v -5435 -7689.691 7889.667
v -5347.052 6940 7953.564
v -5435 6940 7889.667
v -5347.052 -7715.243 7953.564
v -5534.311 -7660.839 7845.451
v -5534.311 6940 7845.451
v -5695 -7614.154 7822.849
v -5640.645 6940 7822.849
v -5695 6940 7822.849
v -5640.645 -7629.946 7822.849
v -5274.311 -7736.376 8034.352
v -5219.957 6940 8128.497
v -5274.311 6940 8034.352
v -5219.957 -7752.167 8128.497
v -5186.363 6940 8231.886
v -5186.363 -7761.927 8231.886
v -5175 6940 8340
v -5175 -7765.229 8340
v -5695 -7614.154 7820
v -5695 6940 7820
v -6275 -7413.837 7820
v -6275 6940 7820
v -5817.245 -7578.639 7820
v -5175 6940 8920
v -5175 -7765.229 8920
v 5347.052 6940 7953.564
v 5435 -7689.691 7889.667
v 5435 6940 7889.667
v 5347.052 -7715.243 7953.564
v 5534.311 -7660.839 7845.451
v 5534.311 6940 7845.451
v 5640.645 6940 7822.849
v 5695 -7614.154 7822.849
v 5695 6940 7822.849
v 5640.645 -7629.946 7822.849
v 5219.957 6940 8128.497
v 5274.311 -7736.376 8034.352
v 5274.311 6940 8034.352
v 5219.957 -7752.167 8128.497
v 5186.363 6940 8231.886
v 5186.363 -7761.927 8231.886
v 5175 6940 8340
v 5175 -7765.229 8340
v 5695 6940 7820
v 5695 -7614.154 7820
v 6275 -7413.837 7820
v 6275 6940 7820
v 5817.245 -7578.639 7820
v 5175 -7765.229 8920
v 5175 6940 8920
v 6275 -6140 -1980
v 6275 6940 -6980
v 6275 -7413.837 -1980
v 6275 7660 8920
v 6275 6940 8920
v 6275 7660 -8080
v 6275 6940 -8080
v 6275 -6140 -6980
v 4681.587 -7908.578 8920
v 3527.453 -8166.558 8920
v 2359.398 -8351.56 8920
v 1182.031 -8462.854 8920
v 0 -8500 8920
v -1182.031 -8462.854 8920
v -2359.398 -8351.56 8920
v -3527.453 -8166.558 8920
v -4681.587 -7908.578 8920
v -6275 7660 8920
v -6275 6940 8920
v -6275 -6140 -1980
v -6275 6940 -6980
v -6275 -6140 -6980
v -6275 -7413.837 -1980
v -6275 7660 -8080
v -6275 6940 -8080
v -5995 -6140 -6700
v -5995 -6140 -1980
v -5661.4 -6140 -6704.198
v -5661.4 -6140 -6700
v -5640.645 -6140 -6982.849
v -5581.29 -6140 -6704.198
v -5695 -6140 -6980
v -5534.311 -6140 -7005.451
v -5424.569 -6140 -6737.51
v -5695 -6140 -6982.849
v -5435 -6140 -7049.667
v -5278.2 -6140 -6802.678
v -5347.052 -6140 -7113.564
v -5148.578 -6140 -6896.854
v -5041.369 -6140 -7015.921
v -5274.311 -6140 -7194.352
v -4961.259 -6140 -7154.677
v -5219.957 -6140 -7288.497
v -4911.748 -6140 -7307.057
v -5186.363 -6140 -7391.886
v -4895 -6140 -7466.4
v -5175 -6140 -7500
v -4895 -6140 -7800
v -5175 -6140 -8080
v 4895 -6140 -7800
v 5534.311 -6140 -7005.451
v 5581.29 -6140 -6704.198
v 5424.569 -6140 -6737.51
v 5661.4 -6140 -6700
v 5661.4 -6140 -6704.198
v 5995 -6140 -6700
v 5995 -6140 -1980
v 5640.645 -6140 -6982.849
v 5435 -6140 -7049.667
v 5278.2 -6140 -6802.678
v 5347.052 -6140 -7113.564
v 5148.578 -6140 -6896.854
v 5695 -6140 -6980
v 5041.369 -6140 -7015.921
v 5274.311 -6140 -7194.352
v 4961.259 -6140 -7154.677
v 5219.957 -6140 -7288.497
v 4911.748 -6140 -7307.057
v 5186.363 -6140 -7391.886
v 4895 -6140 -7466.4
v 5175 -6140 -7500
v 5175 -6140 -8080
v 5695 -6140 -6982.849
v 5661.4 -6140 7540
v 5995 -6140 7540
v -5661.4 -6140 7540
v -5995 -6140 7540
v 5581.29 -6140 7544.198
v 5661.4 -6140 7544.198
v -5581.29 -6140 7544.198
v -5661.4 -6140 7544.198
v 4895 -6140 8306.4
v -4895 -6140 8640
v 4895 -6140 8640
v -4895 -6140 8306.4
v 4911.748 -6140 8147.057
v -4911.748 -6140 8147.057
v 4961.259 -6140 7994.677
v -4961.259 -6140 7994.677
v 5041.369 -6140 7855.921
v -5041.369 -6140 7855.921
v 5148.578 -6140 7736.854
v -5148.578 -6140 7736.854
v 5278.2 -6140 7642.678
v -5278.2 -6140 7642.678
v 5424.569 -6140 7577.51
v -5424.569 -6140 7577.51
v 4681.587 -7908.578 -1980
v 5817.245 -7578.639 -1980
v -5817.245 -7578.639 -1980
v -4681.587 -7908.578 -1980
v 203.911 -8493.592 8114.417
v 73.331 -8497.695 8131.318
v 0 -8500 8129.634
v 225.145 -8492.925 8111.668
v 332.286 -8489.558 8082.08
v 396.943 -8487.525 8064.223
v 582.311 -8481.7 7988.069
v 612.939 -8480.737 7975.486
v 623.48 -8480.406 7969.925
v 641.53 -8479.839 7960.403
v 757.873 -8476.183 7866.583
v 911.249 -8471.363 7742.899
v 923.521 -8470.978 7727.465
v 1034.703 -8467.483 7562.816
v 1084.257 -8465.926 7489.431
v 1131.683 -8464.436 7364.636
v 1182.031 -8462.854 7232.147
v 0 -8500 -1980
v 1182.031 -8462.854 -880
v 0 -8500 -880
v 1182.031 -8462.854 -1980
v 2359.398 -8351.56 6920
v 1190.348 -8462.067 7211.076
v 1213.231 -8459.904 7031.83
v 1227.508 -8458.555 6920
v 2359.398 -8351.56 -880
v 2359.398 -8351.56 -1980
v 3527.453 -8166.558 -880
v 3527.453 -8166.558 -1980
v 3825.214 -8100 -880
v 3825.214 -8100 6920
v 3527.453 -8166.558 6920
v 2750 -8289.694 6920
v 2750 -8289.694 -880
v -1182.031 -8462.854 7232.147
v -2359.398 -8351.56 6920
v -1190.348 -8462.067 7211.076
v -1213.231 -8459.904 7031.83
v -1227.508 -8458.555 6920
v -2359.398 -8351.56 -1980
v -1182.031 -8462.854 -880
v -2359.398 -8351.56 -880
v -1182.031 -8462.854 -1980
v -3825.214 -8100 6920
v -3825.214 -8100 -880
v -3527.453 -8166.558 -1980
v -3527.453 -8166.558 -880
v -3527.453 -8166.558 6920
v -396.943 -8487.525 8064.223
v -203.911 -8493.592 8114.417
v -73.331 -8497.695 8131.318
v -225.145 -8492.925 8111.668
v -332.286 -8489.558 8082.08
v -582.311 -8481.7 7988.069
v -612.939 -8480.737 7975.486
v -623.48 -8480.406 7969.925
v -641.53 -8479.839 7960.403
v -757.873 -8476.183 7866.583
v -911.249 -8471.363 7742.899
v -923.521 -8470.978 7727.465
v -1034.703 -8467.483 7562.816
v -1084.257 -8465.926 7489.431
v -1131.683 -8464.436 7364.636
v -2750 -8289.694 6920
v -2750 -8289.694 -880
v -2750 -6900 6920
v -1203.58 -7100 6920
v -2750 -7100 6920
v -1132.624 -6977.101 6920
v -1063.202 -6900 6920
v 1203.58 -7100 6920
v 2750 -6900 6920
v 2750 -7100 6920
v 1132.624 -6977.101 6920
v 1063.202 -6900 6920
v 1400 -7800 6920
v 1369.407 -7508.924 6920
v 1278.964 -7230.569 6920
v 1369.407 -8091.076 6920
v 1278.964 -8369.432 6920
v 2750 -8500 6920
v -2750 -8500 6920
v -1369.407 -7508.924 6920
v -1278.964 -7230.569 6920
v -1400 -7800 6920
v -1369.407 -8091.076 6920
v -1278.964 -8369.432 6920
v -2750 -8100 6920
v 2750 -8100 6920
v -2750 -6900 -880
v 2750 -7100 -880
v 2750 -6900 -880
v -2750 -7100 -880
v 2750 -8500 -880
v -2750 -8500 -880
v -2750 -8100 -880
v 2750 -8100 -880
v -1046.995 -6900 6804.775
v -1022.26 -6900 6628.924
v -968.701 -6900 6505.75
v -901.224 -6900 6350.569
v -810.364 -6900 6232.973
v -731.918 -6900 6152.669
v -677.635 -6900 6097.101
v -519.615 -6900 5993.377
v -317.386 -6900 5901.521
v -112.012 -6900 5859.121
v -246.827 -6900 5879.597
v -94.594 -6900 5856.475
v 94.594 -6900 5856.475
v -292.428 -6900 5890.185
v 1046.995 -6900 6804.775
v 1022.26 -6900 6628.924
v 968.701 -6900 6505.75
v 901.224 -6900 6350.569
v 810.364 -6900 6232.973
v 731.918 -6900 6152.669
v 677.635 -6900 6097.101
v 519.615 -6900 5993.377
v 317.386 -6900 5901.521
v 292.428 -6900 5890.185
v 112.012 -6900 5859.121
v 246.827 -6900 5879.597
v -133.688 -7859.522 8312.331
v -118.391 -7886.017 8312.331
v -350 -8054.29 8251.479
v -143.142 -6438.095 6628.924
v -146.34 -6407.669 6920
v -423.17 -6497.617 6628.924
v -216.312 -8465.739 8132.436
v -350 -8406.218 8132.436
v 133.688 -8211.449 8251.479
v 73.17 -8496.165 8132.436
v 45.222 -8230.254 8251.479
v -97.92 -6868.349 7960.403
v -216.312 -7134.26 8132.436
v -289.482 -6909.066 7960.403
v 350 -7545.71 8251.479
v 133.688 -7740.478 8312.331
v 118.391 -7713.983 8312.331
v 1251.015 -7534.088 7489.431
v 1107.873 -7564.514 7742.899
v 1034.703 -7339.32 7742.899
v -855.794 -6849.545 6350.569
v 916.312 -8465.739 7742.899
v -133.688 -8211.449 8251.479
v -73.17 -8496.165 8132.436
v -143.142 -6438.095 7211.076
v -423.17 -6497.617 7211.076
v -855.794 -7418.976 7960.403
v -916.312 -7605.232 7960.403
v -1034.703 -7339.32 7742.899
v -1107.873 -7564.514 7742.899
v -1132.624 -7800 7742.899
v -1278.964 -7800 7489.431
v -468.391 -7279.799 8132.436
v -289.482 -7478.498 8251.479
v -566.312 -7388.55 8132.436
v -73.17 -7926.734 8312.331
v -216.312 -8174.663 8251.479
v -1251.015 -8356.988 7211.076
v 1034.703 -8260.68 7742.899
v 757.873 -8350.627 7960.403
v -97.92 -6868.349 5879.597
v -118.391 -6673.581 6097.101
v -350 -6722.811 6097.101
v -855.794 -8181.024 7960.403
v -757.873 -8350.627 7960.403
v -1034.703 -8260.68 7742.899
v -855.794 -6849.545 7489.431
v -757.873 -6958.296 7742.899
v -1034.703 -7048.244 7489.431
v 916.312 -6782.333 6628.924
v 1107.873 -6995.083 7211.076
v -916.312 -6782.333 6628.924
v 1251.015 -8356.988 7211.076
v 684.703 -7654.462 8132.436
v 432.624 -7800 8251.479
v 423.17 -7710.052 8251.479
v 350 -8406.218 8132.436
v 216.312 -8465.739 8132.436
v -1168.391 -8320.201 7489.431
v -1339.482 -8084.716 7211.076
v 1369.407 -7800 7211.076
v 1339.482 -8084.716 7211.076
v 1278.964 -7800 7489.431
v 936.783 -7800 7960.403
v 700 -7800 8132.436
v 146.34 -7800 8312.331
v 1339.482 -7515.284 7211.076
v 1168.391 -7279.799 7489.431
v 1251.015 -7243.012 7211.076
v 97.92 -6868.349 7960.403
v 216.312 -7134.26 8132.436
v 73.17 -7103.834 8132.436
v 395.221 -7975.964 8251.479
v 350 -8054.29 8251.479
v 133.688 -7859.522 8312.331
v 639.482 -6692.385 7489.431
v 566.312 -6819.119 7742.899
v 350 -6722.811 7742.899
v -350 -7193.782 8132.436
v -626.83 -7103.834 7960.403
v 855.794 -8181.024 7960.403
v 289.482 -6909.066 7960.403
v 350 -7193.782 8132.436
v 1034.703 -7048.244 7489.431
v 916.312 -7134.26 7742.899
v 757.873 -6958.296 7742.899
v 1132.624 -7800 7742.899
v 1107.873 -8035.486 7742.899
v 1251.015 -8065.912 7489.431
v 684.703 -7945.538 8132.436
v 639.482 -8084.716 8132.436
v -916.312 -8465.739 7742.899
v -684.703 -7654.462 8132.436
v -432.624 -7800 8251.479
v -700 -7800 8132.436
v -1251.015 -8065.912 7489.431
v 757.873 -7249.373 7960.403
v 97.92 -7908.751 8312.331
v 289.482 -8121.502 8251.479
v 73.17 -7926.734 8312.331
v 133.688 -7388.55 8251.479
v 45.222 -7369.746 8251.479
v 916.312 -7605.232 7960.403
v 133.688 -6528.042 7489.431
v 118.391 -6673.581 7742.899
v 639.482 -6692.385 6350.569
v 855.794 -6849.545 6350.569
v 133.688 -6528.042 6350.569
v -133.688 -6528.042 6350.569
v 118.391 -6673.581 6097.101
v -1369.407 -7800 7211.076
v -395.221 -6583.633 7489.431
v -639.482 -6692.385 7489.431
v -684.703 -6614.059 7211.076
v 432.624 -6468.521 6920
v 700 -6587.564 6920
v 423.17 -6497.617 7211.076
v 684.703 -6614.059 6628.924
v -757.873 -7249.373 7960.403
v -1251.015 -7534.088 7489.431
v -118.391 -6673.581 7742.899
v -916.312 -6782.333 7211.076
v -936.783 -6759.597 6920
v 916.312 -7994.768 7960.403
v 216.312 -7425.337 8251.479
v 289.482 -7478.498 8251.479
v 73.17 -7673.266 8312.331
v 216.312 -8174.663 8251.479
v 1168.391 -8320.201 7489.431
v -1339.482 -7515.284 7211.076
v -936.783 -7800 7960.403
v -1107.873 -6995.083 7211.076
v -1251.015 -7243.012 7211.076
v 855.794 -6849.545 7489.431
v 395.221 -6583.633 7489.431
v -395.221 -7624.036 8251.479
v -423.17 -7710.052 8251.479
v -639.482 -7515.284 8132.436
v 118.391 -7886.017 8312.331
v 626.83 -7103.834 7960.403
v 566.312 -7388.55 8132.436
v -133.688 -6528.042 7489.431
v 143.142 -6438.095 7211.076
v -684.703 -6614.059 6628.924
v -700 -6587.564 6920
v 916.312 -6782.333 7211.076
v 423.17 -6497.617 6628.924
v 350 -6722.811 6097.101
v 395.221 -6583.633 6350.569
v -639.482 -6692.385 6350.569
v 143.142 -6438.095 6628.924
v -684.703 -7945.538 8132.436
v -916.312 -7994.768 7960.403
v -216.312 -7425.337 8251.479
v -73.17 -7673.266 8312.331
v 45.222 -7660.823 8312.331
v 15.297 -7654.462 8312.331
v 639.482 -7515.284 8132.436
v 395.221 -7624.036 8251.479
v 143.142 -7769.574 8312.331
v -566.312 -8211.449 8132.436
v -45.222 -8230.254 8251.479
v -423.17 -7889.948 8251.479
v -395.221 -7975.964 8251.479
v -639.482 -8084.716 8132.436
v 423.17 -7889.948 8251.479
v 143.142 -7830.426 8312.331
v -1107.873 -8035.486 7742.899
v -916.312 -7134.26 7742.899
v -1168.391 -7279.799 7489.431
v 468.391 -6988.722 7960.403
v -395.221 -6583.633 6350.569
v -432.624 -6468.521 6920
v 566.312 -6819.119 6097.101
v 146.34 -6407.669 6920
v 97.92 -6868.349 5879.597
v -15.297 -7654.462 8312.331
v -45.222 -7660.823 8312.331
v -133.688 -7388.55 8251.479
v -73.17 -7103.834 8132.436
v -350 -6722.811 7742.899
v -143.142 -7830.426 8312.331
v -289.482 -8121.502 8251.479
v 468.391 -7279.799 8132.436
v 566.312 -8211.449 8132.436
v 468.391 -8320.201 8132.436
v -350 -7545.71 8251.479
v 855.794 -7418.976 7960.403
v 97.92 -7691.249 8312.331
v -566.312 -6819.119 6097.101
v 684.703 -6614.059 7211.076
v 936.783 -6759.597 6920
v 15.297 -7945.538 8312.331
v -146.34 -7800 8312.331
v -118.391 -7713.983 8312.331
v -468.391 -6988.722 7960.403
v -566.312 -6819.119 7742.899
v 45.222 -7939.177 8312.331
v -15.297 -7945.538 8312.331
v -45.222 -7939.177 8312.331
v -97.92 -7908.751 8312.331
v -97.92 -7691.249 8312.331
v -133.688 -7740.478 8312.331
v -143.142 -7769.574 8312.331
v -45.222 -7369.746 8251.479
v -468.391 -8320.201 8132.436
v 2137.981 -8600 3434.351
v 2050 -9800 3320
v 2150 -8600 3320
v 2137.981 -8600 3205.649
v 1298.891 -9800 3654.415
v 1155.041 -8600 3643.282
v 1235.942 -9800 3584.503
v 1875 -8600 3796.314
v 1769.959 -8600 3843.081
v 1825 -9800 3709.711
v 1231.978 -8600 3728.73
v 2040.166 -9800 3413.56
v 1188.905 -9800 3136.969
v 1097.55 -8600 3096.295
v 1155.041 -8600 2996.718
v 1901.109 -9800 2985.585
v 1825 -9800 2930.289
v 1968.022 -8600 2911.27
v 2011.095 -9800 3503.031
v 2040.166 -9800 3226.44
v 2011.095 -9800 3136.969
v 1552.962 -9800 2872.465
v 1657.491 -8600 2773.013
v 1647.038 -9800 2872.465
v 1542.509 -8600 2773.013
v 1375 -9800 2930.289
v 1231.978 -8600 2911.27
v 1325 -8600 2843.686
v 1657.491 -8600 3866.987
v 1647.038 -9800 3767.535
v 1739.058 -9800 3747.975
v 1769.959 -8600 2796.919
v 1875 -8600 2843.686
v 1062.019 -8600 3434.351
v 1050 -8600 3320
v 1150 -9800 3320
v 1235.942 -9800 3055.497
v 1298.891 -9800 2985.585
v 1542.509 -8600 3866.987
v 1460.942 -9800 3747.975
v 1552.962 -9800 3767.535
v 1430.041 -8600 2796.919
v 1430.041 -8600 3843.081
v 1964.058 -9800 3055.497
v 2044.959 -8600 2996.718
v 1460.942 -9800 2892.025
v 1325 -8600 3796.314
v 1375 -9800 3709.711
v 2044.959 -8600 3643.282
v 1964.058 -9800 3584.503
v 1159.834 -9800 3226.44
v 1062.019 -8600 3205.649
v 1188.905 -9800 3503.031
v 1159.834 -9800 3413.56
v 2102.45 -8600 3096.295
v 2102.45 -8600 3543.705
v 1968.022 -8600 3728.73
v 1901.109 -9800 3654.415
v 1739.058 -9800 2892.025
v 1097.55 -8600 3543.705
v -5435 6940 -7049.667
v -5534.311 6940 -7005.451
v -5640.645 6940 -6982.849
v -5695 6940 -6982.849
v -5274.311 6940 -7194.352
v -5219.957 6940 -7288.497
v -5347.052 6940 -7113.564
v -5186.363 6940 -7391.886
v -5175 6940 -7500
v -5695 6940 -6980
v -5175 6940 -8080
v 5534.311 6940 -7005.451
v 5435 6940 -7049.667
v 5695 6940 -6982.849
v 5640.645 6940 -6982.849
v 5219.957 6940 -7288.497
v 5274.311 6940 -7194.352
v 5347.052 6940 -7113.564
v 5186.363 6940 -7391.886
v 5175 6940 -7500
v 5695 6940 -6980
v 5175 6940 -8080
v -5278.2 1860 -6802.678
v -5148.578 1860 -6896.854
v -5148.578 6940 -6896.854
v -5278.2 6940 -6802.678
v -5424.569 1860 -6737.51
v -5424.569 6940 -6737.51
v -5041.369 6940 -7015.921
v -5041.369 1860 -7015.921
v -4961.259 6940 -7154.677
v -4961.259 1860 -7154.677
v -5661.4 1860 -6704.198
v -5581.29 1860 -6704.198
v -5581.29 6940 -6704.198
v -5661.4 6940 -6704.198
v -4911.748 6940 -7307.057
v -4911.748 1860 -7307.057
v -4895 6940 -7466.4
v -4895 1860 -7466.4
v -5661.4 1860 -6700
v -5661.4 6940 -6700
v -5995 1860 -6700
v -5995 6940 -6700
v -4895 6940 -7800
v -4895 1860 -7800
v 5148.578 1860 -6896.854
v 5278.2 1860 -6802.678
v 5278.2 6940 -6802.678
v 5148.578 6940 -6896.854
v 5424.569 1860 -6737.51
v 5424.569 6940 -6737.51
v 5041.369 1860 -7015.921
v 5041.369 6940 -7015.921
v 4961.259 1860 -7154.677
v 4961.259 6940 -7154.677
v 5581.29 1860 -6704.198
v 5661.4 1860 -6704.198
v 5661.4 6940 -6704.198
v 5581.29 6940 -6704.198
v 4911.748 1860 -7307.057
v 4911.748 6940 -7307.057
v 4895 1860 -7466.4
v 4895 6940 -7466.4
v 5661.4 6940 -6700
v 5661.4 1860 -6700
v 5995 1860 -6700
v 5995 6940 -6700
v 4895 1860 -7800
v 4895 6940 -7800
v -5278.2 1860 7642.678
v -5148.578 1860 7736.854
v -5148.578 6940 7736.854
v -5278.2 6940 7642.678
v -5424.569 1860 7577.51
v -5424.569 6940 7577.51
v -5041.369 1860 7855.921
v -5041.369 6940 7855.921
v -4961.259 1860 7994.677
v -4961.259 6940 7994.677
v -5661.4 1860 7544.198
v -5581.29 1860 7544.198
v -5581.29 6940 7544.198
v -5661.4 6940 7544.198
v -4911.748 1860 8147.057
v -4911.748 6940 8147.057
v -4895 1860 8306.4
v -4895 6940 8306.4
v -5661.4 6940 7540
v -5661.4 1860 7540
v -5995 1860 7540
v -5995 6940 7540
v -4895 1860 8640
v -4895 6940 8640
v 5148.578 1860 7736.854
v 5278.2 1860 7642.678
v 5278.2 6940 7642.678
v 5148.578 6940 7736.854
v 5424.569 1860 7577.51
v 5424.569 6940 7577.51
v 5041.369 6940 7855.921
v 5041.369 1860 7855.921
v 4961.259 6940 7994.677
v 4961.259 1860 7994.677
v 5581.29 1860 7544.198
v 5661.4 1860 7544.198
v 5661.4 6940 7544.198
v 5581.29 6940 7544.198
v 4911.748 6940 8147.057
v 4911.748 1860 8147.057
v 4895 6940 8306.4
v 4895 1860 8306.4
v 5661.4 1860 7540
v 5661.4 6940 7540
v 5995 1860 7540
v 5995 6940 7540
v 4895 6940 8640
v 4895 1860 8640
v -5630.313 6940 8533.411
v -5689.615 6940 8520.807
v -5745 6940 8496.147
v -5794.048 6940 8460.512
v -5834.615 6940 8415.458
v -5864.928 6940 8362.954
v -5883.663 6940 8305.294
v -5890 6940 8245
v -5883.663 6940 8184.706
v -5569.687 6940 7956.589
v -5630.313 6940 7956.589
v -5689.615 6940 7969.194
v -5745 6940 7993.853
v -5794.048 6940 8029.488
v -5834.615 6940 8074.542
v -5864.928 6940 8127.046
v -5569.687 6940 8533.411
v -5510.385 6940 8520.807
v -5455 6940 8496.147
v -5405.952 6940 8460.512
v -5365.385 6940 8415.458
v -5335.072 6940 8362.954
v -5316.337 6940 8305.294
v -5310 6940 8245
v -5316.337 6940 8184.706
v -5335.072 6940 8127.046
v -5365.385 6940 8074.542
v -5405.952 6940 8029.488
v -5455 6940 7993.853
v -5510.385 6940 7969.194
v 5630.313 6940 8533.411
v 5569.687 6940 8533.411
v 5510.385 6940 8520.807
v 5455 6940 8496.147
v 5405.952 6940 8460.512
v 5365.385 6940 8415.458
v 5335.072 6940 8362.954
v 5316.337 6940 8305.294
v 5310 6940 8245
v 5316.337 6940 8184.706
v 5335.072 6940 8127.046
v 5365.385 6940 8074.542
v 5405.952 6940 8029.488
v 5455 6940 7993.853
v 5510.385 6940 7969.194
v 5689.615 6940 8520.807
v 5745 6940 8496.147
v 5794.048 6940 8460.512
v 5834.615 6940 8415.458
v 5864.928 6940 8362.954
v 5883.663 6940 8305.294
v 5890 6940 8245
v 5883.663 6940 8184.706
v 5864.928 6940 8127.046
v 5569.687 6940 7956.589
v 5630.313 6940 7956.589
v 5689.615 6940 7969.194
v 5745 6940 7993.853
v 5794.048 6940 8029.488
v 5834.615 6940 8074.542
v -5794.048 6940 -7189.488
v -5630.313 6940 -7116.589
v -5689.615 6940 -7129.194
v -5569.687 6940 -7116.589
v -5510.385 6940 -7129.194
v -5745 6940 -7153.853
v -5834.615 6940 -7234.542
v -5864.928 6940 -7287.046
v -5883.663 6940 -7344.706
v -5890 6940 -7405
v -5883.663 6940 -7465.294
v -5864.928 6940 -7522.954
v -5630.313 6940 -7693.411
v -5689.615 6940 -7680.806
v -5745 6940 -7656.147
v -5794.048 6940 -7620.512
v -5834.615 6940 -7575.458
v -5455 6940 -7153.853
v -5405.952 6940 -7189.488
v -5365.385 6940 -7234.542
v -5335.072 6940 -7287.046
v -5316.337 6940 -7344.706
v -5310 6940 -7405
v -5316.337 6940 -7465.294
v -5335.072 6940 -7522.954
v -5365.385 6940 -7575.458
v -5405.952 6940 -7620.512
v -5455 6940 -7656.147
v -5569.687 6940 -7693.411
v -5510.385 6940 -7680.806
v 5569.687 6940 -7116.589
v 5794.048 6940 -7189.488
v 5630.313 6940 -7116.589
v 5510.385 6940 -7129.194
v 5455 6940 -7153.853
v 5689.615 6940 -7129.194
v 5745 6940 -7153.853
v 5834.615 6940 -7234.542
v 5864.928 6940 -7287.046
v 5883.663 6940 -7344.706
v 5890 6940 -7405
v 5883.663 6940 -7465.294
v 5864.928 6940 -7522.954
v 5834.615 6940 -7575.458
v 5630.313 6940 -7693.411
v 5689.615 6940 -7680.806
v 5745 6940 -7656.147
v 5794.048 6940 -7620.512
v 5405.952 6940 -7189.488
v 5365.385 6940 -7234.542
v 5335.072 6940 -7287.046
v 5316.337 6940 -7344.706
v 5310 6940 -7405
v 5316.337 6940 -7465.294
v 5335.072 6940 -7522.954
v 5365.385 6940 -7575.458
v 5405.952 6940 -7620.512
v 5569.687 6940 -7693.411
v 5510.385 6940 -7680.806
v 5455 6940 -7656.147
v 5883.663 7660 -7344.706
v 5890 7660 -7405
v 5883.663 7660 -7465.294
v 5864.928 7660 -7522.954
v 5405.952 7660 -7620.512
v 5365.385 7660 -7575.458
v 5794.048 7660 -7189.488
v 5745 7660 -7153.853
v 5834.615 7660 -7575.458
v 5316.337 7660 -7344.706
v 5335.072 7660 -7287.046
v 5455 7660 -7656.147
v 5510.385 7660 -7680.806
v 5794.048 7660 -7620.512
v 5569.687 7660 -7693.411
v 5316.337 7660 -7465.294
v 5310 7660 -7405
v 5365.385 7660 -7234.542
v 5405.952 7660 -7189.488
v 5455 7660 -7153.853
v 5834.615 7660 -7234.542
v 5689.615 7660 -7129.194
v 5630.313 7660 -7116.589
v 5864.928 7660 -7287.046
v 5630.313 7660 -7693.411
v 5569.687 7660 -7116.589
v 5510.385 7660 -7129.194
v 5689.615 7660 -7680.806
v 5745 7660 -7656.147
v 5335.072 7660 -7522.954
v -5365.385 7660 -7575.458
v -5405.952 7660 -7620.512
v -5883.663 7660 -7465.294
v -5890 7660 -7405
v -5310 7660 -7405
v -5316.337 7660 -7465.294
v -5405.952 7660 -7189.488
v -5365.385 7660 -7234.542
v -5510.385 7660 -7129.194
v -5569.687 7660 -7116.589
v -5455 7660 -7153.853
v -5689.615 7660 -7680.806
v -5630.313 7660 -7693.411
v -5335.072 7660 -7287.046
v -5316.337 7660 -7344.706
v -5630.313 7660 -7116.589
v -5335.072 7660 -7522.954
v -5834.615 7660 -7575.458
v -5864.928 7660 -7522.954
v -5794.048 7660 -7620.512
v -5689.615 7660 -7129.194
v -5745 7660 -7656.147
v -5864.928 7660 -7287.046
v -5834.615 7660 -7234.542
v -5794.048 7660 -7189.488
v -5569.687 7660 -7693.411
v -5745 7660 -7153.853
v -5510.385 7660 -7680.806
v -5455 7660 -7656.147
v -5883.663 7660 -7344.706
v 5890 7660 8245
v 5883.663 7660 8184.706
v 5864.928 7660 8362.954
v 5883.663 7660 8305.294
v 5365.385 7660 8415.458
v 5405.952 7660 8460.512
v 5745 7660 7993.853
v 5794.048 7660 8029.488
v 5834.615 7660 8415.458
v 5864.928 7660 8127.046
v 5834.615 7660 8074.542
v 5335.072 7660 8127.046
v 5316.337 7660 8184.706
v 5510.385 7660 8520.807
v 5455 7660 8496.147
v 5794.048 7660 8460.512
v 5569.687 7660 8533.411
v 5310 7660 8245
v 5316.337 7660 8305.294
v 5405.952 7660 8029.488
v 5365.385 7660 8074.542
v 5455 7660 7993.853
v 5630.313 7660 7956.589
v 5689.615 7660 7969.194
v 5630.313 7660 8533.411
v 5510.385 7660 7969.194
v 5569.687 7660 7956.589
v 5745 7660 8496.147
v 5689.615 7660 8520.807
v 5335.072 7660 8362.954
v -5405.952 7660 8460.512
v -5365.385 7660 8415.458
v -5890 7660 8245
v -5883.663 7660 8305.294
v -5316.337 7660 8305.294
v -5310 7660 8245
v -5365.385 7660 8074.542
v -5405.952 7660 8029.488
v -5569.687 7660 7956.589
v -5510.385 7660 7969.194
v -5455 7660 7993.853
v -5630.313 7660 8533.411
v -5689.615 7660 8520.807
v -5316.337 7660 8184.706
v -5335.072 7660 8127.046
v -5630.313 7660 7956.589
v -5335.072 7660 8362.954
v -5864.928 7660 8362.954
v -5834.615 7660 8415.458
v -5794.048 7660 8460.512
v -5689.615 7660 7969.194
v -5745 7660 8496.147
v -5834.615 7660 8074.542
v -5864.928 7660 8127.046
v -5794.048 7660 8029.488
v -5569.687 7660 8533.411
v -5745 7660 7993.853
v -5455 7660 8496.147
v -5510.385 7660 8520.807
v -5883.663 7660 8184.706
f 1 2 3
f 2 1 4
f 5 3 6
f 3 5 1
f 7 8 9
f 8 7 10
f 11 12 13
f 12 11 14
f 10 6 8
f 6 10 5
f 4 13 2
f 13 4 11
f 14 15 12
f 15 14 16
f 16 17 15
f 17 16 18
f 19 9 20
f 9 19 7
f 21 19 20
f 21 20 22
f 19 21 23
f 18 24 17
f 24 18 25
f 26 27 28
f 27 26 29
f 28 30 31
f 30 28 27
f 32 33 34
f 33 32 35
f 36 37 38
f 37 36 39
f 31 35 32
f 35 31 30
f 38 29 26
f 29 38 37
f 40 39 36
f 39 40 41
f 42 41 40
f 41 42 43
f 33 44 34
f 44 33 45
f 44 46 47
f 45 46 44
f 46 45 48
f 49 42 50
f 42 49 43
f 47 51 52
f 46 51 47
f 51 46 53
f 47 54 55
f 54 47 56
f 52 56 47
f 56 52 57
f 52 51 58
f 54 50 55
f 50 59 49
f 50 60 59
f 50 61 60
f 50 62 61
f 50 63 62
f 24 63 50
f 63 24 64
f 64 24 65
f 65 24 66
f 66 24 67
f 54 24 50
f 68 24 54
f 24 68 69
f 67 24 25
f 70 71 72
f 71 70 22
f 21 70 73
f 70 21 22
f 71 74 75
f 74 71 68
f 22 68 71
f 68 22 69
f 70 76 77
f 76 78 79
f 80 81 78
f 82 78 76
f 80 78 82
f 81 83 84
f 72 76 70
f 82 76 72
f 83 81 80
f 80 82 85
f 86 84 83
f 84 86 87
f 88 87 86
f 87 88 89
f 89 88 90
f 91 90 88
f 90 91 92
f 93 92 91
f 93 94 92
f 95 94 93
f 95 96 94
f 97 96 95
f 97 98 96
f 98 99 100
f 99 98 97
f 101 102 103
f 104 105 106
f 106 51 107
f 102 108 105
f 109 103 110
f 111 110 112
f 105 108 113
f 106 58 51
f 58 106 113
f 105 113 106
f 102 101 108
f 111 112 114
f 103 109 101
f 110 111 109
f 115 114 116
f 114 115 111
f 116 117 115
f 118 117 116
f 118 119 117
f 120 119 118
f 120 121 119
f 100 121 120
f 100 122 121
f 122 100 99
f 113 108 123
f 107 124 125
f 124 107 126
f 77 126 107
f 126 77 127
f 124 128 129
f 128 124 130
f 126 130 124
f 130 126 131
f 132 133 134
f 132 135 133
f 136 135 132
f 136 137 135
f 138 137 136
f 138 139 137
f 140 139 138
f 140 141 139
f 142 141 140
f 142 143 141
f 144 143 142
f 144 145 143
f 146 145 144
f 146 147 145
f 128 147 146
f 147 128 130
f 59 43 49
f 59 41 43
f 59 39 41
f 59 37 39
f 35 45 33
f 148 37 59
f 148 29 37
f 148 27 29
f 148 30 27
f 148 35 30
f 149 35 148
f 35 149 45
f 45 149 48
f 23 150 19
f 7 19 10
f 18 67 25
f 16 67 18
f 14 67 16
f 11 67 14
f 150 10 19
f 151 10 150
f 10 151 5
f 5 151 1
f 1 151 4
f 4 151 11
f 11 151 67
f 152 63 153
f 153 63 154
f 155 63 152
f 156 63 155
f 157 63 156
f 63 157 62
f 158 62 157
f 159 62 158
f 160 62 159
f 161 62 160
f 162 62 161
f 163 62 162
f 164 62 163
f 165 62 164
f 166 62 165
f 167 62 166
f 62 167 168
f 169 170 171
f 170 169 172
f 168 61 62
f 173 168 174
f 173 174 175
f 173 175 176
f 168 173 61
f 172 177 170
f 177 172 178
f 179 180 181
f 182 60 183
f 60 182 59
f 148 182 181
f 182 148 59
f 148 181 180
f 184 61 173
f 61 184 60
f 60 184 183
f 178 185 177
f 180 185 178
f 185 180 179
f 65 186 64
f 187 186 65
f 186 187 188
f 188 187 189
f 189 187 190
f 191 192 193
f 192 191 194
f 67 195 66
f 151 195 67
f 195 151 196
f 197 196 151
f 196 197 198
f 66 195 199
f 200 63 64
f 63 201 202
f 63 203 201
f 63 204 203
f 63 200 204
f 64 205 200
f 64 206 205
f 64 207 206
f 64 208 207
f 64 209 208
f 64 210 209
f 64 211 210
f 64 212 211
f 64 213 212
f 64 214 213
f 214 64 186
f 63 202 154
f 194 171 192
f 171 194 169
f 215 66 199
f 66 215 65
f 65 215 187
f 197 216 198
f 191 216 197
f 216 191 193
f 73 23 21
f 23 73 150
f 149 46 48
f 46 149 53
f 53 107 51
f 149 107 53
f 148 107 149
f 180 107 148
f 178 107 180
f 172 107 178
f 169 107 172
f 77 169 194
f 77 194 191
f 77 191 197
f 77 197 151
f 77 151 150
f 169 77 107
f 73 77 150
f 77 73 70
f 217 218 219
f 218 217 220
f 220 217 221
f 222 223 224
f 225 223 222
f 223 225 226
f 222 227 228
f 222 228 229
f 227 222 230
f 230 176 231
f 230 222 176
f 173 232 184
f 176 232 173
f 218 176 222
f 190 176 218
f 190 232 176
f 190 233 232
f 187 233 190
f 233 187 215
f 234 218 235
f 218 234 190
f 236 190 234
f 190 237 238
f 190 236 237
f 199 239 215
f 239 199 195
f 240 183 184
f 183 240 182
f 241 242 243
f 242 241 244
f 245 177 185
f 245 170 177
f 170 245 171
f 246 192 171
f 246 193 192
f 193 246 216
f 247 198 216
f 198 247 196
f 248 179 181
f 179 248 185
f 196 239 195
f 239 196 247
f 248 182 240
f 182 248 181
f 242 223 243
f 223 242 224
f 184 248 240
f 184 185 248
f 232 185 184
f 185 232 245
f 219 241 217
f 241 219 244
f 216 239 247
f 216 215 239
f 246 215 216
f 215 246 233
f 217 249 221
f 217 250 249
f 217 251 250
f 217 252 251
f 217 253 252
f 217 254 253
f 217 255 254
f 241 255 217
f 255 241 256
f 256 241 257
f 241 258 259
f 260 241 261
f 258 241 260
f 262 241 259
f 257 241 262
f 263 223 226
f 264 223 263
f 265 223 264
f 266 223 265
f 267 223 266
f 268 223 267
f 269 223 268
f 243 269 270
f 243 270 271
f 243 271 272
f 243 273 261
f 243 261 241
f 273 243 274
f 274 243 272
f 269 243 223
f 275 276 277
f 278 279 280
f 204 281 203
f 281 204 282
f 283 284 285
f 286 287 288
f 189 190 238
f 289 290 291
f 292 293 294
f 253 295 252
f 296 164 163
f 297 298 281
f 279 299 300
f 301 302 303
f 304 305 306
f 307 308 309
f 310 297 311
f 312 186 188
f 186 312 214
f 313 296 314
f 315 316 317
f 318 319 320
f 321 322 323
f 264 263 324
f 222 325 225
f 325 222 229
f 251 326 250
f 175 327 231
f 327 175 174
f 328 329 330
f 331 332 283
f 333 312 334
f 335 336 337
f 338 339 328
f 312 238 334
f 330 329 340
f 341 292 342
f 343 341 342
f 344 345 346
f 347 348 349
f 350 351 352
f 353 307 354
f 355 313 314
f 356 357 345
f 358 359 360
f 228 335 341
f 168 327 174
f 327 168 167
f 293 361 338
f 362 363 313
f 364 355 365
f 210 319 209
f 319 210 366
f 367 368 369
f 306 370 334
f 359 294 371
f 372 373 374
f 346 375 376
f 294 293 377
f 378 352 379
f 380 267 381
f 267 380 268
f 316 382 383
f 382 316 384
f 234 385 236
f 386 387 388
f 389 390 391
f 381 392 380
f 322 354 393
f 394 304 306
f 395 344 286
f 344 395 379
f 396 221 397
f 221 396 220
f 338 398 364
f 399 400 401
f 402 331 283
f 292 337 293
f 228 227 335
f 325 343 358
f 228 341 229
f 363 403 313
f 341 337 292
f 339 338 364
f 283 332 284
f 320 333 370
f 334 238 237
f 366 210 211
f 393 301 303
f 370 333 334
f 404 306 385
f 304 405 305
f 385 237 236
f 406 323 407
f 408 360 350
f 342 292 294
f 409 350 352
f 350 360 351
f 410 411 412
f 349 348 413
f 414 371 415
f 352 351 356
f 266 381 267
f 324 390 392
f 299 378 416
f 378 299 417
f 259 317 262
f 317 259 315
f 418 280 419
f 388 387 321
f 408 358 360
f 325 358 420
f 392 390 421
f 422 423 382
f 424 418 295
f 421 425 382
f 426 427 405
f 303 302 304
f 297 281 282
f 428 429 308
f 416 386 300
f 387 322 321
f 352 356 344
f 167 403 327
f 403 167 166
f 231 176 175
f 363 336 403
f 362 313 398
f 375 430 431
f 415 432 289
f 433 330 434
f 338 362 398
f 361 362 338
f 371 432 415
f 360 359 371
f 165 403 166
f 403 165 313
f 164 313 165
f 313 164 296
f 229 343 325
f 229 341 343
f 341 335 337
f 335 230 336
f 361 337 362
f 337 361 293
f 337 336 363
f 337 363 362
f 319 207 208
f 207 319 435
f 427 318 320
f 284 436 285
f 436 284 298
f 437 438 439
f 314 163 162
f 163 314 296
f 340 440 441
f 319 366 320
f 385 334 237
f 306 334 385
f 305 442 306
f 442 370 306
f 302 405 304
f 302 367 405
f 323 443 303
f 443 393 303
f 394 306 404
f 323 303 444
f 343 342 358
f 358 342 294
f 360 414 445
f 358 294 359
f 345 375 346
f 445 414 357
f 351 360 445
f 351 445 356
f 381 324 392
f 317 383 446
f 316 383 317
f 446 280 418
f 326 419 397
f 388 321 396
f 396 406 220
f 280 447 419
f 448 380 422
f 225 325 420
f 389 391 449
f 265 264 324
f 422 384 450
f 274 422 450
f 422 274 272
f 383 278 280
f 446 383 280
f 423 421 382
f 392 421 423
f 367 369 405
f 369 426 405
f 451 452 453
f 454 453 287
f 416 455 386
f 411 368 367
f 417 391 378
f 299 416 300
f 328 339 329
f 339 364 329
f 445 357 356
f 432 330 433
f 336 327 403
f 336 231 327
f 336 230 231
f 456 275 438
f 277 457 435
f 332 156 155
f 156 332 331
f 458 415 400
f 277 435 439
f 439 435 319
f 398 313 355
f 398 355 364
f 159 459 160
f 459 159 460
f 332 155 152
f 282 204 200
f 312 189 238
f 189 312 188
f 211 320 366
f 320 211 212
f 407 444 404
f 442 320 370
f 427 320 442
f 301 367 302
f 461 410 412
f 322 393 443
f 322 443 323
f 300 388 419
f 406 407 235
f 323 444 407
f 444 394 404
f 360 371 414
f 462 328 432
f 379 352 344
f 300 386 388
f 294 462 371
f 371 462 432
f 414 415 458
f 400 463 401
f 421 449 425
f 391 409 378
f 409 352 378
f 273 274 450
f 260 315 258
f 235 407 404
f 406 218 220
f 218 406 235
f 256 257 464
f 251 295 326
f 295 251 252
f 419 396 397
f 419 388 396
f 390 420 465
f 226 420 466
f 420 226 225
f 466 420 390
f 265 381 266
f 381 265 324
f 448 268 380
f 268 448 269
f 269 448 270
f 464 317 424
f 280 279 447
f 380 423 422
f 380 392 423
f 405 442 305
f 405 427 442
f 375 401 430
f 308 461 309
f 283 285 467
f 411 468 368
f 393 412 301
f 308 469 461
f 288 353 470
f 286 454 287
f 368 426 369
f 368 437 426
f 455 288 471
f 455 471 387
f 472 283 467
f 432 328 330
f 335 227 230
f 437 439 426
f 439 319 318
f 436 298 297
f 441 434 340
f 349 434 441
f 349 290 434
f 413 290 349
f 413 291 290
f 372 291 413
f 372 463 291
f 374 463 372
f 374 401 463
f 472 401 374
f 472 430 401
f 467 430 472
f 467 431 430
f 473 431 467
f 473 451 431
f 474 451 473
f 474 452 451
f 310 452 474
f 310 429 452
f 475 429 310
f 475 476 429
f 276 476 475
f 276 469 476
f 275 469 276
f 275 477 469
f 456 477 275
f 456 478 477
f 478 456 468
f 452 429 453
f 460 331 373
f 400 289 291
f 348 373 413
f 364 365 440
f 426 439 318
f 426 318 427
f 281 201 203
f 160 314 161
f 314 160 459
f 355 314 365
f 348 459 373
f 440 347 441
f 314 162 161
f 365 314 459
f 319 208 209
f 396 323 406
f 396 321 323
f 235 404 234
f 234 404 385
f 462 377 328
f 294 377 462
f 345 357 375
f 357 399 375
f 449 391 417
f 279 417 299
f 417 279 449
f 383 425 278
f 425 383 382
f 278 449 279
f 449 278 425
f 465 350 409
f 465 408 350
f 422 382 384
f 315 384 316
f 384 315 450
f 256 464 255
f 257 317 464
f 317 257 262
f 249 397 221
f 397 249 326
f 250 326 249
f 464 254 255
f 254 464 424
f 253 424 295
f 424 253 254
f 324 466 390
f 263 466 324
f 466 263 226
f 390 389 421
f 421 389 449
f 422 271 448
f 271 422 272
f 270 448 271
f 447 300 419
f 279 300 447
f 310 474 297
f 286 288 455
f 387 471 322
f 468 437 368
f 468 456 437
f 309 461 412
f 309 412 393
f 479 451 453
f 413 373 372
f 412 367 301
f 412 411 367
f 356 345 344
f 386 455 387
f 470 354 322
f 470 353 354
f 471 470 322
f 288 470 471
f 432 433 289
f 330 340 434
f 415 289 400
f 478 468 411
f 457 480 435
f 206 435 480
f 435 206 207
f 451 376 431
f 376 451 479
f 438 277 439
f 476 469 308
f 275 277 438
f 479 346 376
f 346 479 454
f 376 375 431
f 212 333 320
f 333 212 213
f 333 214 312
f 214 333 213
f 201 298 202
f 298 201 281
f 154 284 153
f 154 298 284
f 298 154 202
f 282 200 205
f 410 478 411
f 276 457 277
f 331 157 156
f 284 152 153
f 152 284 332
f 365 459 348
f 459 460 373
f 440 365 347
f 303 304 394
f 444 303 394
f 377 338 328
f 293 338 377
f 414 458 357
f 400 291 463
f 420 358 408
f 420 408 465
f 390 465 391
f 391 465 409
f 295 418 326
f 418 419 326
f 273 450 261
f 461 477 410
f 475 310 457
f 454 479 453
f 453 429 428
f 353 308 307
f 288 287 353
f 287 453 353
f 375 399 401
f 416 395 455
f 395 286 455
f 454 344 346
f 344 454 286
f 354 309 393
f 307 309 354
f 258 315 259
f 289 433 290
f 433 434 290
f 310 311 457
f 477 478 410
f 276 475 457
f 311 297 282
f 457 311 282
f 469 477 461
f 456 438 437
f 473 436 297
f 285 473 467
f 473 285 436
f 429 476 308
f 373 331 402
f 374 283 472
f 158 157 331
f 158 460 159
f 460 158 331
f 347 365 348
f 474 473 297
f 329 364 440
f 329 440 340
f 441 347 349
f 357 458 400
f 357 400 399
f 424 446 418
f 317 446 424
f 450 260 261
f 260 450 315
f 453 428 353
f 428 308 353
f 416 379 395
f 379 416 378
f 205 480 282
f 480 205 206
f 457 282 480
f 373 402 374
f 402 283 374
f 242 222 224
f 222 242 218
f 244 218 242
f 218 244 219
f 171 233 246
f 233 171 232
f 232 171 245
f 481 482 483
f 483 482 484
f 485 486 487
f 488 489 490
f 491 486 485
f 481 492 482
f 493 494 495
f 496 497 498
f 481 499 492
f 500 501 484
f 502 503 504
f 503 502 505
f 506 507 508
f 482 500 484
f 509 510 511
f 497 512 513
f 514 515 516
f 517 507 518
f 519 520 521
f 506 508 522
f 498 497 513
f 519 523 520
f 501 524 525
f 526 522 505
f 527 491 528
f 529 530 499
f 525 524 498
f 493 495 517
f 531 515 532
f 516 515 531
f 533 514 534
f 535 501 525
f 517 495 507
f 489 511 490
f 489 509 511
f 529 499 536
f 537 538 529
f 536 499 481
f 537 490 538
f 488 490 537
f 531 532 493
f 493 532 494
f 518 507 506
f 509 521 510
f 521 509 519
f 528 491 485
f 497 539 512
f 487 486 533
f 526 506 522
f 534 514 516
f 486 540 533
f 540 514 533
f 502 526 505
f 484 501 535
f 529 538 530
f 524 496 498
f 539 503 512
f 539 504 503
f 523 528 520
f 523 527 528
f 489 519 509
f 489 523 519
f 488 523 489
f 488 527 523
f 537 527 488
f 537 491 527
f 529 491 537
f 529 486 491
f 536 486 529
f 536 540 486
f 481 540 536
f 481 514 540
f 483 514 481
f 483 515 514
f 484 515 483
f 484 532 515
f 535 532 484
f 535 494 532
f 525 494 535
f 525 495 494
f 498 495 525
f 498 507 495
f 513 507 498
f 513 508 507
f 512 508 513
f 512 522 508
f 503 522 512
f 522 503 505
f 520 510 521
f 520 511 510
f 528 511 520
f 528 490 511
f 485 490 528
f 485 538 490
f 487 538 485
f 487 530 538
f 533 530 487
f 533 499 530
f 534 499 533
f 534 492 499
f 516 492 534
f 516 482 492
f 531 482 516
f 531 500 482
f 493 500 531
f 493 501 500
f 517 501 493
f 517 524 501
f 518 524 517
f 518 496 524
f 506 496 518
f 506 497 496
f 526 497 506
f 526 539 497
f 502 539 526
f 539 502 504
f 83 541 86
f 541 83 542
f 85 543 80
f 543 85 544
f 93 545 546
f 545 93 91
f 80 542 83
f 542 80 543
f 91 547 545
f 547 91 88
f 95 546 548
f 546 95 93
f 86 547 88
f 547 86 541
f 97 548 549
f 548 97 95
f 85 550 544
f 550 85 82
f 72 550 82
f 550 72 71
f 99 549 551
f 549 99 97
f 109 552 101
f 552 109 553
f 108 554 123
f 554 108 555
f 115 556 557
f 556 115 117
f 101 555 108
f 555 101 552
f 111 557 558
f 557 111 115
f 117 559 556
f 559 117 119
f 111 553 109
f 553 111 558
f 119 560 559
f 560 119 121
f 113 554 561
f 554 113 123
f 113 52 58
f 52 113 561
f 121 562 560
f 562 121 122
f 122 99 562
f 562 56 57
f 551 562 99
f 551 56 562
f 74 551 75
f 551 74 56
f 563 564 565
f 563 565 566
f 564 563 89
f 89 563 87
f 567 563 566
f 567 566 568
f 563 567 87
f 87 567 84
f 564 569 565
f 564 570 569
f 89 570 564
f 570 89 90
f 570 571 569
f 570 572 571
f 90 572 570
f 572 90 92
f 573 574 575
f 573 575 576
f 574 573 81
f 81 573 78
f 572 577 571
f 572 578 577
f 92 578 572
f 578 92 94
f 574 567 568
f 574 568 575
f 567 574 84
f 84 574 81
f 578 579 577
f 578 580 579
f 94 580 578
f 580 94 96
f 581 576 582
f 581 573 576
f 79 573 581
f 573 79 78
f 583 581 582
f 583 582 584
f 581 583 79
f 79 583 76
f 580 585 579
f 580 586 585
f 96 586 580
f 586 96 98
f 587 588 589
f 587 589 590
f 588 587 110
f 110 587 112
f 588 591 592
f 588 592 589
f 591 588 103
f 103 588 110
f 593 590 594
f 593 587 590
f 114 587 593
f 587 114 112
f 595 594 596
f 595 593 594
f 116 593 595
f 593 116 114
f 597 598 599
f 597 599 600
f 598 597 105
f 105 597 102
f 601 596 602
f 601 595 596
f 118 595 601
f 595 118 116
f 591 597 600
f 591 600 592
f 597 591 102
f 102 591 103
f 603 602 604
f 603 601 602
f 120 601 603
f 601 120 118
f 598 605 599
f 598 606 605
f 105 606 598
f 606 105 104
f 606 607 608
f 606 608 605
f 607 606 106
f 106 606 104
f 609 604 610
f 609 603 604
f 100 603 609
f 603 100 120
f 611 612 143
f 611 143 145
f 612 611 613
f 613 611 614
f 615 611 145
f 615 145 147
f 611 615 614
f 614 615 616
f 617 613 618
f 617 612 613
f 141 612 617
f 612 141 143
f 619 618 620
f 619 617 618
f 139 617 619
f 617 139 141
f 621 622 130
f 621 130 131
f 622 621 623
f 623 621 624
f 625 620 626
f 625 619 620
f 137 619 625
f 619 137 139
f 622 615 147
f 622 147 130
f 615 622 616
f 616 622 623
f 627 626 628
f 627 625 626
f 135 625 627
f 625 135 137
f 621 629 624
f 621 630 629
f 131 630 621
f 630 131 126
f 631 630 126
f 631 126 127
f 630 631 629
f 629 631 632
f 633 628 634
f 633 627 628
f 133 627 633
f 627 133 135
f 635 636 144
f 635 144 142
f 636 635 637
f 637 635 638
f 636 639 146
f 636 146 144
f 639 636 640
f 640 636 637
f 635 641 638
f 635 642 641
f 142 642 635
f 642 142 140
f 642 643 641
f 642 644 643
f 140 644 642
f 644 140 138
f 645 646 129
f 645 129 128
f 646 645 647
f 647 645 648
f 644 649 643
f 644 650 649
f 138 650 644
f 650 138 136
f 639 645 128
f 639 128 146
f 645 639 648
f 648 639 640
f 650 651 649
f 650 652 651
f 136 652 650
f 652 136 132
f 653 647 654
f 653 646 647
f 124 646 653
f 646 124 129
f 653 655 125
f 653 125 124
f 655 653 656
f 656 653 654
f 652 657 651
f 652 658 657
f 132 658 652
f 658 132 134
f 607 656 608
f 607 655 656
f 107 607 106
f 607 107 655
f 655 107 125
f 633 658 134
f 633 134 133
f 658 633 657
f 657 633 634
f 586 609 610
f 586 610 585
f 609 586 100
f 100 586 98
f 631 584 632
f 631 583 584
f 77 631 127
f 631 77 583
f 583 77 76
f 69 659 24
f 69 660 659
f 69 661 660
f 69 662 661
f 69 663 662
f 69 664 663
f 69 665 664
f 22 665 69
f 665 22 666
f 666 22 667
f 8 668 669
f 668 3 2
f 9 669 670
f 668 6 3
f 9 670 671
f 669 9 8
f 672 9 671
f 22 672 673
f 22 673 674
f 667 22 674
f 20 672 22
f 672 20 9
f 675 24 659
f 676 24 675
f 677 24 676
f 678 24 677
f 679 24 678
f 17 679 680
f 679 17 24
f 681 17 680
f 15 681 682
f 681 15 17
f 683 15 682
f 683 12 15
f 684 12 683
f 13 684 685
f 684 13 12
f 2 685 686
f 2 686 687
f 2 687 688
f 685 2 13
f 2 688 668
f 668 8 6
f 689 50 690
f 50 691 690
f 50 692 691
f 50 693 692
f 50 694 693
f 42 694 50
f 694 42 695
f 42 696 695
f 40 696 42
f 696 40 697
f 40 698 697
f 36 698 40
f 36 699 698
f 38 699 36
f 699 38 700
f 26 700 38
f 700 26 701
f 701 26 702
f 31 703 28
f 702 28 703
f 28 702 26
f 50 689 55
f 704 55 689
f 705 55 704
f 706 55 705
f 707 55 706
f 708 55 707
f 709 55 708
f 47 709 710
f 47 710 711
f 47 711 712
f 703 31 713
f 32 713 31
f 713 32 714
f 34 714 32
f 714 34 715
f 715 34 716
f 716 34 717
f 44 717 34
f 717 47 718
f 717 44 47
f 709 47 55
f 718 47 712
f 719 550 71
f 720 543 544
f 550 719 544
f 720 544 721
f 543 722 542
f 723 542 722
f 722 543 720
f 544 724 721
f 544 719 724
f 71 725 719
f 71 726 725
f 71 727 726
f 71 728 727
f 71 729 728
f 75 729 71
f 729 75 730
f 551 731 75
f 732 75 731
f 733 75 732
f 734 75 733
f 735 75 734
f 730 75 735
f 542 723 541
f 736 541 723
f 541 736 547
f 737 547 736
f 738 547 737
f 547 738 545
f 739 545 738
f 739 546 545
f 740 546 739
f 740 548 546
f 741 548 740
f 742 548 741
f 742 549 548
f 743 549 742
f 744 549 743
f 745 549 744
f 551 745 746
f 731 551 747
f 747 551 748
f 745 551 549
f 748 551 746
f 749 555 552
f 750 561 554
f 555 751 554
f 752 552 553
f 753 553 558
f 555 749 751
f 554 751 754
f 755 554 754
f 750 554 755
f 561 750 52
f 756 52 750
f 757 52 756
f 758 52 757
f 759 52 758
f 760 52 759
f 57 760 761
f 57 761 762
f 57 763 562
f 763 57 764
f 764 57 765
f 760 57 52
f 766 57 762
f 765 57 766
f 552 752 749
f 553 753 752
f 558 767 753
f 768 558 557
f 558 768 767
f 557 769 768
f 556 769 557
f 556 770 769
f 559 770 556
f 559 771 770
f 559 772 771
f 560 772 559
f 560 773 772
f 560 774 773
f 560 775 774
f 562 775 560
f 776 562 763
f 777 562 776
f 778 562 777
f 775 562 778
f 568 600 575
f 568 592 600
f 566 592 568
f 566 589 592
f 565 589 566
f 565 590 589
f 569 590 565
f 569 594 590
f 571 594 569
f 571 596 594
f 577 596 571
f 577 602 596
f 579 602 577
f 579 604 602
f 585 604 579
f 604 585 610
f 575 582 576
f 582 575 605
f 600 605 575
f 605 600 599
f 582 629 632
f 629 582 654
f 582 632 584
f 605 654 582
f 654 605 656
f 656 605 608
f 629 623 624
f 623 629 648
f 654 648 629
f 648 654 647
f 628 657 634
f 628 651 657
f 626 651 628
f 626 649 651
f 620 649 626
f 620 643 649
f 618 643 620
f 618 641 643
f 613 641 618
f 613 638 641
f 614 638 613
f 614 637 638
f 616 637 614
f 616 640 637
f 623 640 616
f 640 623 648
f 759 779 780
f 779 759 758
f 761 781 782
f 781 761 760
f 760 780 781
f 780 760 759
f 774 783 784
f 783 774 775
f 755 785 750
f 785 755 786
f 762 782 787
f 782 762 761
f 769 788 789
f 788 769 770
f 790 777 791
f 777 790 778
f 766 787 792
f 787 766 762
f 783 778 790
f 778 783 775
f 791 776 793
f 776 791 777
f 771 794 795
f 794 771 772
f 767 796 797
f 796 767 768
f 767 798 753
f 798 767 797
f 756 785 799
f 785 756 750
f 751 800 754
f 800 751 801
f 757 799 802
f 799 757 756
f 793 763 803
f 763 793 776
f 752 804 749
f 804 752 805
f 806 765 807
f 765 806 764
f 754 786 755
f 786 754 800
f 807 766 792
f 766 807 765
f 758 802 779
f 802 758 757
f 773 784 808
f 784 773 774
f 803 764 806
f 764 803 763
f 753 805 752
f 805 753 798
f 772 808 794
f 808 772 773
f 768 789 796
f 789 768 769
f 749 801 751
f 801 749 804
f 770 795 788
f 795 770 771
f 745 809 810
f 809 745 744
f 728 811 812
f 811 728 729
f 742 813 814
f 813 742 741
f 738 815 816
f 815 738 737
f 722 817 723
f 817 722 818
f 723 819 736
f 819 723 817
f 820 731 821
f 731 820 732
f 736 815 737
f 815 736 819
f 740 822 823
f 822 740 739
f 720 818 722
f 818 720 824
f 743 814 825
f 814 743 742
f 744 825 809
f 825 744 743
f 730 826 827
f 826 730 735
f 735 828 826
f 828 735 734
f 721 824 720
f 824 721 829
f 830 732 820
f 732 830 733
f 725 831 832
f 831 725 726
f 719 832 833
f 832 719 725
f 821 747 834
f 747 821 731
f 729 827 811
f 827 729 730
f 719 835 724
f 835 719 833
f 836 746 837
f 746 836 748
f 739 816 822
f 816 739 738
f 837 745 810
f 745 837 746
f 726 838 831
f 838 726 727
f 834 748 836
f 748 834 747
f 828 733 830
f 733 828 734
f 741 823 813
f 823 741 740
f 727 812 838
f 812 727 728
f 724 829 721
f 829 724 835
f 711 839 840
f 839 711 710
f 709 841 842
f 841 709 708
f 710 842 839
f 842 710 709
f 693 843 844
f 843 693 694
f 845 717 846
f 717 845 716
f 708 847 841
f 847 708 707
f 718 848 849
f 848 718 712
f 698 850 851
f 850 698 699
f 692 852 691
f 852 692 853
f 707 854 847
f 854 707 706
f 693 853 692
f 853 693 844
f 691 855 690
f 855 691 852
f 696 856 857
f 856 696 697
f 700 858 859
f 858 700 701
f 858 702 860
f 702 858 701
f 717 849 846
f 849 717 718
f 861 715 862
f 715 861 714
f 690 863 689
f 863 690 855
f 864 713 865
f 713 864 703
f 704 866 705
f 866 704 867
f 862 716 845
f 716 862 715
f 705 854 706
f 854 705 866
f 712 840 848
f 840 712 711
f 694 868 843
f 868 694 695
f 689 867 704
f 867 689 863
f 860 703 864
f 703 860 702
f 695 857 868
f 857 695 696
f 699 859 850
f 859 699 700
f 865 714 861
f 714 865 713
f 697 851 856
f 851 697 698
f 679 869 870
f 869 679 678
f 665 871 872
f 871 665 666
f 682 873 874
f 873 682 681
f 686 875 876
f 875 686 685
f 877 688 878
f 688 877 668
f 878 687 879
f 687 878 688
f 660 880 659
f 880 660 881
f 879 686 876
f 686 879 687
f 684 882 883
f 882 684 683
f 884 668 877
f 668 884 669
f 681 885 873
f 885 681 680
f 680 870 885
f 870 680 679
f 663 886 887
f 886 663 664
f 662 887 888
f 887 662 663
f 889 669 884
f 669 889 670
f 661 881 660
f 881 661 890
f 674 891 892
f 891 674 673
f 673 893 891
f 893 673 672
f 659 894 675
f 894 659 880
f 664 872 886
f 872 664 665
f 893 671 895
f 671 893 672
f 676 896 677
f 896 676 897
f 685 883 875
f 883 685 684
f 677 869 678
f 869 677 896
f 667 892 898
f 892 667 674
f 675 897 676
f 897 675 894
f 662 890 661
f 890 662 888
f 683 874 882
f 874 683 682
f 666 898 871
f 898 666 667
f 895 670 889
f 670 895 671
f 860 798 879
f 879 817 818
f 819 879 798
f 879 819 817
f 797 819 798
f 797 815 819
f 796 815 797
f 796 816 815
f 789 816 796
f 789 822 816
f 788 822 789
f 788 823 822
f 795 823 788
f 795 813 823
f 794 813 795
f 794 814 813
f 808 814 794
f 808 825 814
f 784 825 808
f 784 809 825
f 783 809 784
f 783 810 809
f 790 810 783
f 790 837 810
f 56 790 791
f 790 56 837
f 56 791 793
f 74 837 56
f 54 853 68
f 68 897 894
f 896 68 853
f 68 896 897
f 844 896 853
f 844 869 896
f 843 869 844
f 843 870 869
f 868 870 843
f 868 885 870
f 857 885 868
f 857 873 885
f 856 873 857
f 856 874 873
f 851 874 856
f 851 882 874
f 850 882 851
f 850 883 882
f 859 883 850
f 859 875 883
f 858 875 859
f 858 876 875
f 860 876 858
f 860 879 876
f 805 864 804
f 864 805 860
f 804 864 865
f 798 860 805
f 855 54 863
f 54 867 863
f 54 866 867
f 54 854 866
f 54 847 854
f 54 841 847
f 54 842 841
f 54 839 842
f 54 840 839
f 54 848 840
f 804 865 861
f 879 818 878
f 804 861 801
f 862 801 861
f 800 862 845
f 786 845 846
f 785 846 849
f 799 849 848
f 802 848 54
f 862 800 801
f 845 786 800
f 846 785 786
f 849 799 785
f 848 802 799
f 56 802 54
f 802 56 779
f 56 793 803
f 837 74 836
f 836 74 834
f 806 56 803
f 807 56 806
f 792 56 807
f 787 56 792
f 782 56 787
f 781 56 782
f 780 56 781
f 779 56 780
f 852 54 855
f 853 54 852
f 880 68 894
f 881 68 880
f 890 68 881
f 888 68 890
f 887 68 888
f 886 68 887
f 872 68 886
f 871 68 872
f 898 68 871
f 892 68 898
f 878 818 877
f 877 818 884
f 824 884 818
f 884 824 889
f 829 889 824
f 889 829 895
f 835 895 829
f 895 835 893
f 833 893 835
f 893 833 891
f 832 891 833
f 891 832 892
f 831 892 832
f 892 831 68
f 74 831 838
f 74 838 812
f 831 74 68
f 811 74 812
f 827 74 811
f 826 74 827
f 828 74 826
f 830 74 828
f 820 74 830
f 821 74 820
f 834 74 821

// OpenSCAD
// file: ../common/rounded_cube.scad
use <holes.scad>;

module rounded_cube_single(w, l, h, r) {
  d = r * 2;
  
  union() {
    cube([w - d, l, h], center=true);
    cube([w, l, h - d], center=true);
    quad_drilling() translate([-w/2 + r, 0, -h/2 + r]) rotate([90, 0, 0]) cylinder(r=r, h=l, center=true);
  }
}

module rounded_cube(size, r, apply_to="x", center=true) {
  w = size[0];
  l = size[1];
  h = size[2];

  intersection() {
    if (search("x", apply_to)) {
      rounded_cube_single(w, l, h, r);
    }
    if (search("y", apply_to)) {
      rotate([0, 0, 90]) rounded_cube_single(w, l, h, r);
    }
    if (search("z", apply_to)) {
      rotate([90, 0, 0]) rounded_cube_single(w, l, h, r);
    }
  }
}

rounded_cube([100, 100, 100], r=10, apply_to="xyz", center=true);
// file: ../common/holes.scad
module countersunk_hole(h, d, r_inner, r_outer, center=true) {
  centroid = center ? [0, 0, 0] : [r_outer, r_outer, h / 2];
  translate(centroid) {
    translate([0, 0, (h - d) / 2]) cylinder(r=r_outer, h=d + 1, center=true);
    cylinder(r=r_inner, h=h + 1, center=true);
  }
}

module circle_mount(r_mount, r_hole, h) {
  translate([0, r_mount, 0]) cylinder(r=r_hole, h=h + 1, center=true);
  translate([0, -r_mount, 0]) cylinder(r=r_hole, h=h + 1, center=true);
  translate([r_mount, 0, 0]) cylinder(r=r_hole, h=h + 1, center=true);
  translate([-r_mount, 0, 0]) cylinder(r=r_hole, h=h + 1, center=true);
}

module square_mount(r_mount, r_hole, h) {
  translate([r_mount, r_mount, 0]) cylinder(r=r_hole, h=h + 1, center=true);
  translate([r_mount, -r_mount, 0]) cylinder(r=r_hole, h=h + 1, center=true);
  translate([-r_mount, r_mount, 0]) cylinder(r=r_hole, h=h + 1, center=true);
  translate([-r_mount, -r_mount, 0]) cylinder(r=r_hole, h=h + 1, center=true);
}

module mirror_drilling(axis=[1, 0, 0]) {
  children();
  mirror(axis) children();
}

module quad_drilling(axis=[0, 0, 1]) {
  children();
  mirror([1, 0, 0]) children();
  mirror(axis) {
    children();
    mirror([1, 0, 0]) children();
  }
}
// file: ../common/finalise.scad
module finalise(w, h, l, center, flat) {
  if (flat) {
    translate([0, 0, l]) rotate([-90, 0, 0]) children();
  } else if (center) {
    translate([-w/2, -l/2, -h/2]) children();
  } else {
    children();
  }
}
// main file
use <../common/finalise.scad>;
use <../common/holes.scad>;
use <../common/rounded_cube.scad>;

module VFDMiddleInner(w, l, h, rounded) {
  r_cutout = 8000 - h * 0.44;
  d_cutout = 1100;

  difference() {
    cube([w, l, h], center=true);
    mirror_drilling([0, 0, 1]) mirror_drilling([1, 0, 0]) translate([-w/2, 0, -h/2]) {
      if (rounded) {
        rounded_cube([d_cutout * 2, l + 1, d_cutout * 2], r=r_cutout, apply_to="x");
      } else {
        cube([d_cutout * 2, l + 1, d_cutout * 2 + 1], center=true);
      }
    }
  }
}

module VFDMiddle(w, l, h, d_plastic, rounded, center=false) {
  centroid = center ? [0, 0, 0] : [w/2, l/2, h/2];
  translate(centroid) difference() {
    VFDMiddleInner(w, l, h, rounded);
    VFDMiddleInner(w - d_plastic * 2, l + 1, h - d_plastic * 2, rounded);
  }
}

module VFDBack(w, l, h, d_plastic, rounded, center=false) {
  l_backplate = 720;

  centroid = center ? [0, 0, 0] : [w/2, (l - l_backplate)/2, h/2];
  translate(centroid) {
    VFDMiddle(w, l - l_backplate, h, d_plastic, rounded, center=true);

    translate([0, l / 2, 0]) difference() {
      cube([w, l_backplate, h], center=true);

      r_screwhole = 290;
      o_screwhole = 385;
      quad_drilling() translate([w/2 - r_screwhole - o_screwhole, 0, h/2 - r_screwhole - o_screwhole]) {
        rotate([90, 0, 0]) cylinder(r=r_screwhole, h=l_backplate + 1, center=true);
      }
    }
  }
}

module VFDDisplay(w, l, h) {
  color("#aaa") cube([w, l, h], center=true);

  module button(x, y, c, t) {
    translate([-w/2 + 1200 + 1600 * x, 0, -(3200 + 1600 * y)]) {
      rotate([90, 0, 0]) {
        color(c) square([1000, 1000], center=true);
        translate([-100 * len(t), -100, 10]) text(t, size=200);
      }
    }
  }
  
  translate([0, -l/2, h/2 - 400]) {
    translate([0, 0, -1200]) rotate([90, 0, 0]) {
      color("#666") square([4000, 1400], center=true);
    }

    button(0, 0, "#333", "F/R");
    button(1, 0, "#333", "\u25ba\u25ba");
    button(0, 1, "#5e5", "RUN");
    button(1, 1, "#333", "\u25b2");
    button(2, 1, "#333", "PRGM");
    button(0, 2, "#e55", "STOP");
    button(1, 2, "#333", "\u25bc");
    button(2, 2, "#333", "SET");

    translate([1600, -l/2, -3200]) rotate([90, 0, 0]) {
      color("#555") cylinder(1200, 550, 450, center=true);
    }

    color("yellow") {
      translate([-2000, 0, 0]) rotate([90, 0, 0]) text("COM ALM DISP RUN Hz RPM", size=200);
      translate([2000, 0, -600]) rotate([90, 0, 0]) text("FOR", size=200);
      translate([2000, 0, -2000]) rotate([90, 0, 0]) text("REV", size=200);
    }
  }
}

module VFDFront(w, l, h, d_plastic, open, rounded, center=false) {
  r = w * 1.5;
  h_front_top = 10900;

  w_display = 5500;
  l_display = 1400;
  h_display = 7800;
  z_display = 2000;
  
  centroid = center ? [0, 0, 0] : [w/2, l/2, h/2];
  translate(centroid) {
    difference() {
      intersection() {
        VFDMiddleInner(w, l, h, rounded);
        translate([0, r - l / 2, 0]) cylinder(r=r, h=h, center=true, $fn=100);
        translate([-w/2, -l/2, open ? h / 2 - h_front_top : -h/2]) cube([w, l, open ? h_front_top : h]);
      }

      l_flatten = 400;
      translate([0, -(l - l_flatten)/2, (h - h_display)/2 - z_display]) {
        cube([w, l_flatten, h_display], center=true);
        translate([0, l_display / 2, 0])
        cube([w_display, l_display, h_display], center=true);
      }

      translate([0, -(l - l_display)/2, h/2 - z_display]) {
        sphere(r=l_display);
      }
    }

    translate([0, -(l - l_display)/2, (h - h_display)/2 - z_display]) {
      VFDDisplay(w_display, l_display, h_display);
    }
  }
}

function W_VFD() = 12550;
function L_VFD() = 16160;
function H_VFD() = 17000;

module VFD(w=W_VFD(), l=L_VFD(), h=H_VFD(), rounded=true, open=true, center=false, flat=false) {
  l_back = 5800;
  l_middle = 8000;
  l_front = 2360;

  d_plastic = 280;

  finalise(w, l, h, center, flat) {
    VFDFront(w, l_front, h, d_plastic, open, rounded);
    translate([0, l_front, 0]) VFDMiddle(w, l_middle, h, d_plastic, rounded);
    translate([0, l_front + l_middle, 0]) VFDBack(w, l_back, h, d_plastic, rounded);
  }
}

VFD(center=true);
